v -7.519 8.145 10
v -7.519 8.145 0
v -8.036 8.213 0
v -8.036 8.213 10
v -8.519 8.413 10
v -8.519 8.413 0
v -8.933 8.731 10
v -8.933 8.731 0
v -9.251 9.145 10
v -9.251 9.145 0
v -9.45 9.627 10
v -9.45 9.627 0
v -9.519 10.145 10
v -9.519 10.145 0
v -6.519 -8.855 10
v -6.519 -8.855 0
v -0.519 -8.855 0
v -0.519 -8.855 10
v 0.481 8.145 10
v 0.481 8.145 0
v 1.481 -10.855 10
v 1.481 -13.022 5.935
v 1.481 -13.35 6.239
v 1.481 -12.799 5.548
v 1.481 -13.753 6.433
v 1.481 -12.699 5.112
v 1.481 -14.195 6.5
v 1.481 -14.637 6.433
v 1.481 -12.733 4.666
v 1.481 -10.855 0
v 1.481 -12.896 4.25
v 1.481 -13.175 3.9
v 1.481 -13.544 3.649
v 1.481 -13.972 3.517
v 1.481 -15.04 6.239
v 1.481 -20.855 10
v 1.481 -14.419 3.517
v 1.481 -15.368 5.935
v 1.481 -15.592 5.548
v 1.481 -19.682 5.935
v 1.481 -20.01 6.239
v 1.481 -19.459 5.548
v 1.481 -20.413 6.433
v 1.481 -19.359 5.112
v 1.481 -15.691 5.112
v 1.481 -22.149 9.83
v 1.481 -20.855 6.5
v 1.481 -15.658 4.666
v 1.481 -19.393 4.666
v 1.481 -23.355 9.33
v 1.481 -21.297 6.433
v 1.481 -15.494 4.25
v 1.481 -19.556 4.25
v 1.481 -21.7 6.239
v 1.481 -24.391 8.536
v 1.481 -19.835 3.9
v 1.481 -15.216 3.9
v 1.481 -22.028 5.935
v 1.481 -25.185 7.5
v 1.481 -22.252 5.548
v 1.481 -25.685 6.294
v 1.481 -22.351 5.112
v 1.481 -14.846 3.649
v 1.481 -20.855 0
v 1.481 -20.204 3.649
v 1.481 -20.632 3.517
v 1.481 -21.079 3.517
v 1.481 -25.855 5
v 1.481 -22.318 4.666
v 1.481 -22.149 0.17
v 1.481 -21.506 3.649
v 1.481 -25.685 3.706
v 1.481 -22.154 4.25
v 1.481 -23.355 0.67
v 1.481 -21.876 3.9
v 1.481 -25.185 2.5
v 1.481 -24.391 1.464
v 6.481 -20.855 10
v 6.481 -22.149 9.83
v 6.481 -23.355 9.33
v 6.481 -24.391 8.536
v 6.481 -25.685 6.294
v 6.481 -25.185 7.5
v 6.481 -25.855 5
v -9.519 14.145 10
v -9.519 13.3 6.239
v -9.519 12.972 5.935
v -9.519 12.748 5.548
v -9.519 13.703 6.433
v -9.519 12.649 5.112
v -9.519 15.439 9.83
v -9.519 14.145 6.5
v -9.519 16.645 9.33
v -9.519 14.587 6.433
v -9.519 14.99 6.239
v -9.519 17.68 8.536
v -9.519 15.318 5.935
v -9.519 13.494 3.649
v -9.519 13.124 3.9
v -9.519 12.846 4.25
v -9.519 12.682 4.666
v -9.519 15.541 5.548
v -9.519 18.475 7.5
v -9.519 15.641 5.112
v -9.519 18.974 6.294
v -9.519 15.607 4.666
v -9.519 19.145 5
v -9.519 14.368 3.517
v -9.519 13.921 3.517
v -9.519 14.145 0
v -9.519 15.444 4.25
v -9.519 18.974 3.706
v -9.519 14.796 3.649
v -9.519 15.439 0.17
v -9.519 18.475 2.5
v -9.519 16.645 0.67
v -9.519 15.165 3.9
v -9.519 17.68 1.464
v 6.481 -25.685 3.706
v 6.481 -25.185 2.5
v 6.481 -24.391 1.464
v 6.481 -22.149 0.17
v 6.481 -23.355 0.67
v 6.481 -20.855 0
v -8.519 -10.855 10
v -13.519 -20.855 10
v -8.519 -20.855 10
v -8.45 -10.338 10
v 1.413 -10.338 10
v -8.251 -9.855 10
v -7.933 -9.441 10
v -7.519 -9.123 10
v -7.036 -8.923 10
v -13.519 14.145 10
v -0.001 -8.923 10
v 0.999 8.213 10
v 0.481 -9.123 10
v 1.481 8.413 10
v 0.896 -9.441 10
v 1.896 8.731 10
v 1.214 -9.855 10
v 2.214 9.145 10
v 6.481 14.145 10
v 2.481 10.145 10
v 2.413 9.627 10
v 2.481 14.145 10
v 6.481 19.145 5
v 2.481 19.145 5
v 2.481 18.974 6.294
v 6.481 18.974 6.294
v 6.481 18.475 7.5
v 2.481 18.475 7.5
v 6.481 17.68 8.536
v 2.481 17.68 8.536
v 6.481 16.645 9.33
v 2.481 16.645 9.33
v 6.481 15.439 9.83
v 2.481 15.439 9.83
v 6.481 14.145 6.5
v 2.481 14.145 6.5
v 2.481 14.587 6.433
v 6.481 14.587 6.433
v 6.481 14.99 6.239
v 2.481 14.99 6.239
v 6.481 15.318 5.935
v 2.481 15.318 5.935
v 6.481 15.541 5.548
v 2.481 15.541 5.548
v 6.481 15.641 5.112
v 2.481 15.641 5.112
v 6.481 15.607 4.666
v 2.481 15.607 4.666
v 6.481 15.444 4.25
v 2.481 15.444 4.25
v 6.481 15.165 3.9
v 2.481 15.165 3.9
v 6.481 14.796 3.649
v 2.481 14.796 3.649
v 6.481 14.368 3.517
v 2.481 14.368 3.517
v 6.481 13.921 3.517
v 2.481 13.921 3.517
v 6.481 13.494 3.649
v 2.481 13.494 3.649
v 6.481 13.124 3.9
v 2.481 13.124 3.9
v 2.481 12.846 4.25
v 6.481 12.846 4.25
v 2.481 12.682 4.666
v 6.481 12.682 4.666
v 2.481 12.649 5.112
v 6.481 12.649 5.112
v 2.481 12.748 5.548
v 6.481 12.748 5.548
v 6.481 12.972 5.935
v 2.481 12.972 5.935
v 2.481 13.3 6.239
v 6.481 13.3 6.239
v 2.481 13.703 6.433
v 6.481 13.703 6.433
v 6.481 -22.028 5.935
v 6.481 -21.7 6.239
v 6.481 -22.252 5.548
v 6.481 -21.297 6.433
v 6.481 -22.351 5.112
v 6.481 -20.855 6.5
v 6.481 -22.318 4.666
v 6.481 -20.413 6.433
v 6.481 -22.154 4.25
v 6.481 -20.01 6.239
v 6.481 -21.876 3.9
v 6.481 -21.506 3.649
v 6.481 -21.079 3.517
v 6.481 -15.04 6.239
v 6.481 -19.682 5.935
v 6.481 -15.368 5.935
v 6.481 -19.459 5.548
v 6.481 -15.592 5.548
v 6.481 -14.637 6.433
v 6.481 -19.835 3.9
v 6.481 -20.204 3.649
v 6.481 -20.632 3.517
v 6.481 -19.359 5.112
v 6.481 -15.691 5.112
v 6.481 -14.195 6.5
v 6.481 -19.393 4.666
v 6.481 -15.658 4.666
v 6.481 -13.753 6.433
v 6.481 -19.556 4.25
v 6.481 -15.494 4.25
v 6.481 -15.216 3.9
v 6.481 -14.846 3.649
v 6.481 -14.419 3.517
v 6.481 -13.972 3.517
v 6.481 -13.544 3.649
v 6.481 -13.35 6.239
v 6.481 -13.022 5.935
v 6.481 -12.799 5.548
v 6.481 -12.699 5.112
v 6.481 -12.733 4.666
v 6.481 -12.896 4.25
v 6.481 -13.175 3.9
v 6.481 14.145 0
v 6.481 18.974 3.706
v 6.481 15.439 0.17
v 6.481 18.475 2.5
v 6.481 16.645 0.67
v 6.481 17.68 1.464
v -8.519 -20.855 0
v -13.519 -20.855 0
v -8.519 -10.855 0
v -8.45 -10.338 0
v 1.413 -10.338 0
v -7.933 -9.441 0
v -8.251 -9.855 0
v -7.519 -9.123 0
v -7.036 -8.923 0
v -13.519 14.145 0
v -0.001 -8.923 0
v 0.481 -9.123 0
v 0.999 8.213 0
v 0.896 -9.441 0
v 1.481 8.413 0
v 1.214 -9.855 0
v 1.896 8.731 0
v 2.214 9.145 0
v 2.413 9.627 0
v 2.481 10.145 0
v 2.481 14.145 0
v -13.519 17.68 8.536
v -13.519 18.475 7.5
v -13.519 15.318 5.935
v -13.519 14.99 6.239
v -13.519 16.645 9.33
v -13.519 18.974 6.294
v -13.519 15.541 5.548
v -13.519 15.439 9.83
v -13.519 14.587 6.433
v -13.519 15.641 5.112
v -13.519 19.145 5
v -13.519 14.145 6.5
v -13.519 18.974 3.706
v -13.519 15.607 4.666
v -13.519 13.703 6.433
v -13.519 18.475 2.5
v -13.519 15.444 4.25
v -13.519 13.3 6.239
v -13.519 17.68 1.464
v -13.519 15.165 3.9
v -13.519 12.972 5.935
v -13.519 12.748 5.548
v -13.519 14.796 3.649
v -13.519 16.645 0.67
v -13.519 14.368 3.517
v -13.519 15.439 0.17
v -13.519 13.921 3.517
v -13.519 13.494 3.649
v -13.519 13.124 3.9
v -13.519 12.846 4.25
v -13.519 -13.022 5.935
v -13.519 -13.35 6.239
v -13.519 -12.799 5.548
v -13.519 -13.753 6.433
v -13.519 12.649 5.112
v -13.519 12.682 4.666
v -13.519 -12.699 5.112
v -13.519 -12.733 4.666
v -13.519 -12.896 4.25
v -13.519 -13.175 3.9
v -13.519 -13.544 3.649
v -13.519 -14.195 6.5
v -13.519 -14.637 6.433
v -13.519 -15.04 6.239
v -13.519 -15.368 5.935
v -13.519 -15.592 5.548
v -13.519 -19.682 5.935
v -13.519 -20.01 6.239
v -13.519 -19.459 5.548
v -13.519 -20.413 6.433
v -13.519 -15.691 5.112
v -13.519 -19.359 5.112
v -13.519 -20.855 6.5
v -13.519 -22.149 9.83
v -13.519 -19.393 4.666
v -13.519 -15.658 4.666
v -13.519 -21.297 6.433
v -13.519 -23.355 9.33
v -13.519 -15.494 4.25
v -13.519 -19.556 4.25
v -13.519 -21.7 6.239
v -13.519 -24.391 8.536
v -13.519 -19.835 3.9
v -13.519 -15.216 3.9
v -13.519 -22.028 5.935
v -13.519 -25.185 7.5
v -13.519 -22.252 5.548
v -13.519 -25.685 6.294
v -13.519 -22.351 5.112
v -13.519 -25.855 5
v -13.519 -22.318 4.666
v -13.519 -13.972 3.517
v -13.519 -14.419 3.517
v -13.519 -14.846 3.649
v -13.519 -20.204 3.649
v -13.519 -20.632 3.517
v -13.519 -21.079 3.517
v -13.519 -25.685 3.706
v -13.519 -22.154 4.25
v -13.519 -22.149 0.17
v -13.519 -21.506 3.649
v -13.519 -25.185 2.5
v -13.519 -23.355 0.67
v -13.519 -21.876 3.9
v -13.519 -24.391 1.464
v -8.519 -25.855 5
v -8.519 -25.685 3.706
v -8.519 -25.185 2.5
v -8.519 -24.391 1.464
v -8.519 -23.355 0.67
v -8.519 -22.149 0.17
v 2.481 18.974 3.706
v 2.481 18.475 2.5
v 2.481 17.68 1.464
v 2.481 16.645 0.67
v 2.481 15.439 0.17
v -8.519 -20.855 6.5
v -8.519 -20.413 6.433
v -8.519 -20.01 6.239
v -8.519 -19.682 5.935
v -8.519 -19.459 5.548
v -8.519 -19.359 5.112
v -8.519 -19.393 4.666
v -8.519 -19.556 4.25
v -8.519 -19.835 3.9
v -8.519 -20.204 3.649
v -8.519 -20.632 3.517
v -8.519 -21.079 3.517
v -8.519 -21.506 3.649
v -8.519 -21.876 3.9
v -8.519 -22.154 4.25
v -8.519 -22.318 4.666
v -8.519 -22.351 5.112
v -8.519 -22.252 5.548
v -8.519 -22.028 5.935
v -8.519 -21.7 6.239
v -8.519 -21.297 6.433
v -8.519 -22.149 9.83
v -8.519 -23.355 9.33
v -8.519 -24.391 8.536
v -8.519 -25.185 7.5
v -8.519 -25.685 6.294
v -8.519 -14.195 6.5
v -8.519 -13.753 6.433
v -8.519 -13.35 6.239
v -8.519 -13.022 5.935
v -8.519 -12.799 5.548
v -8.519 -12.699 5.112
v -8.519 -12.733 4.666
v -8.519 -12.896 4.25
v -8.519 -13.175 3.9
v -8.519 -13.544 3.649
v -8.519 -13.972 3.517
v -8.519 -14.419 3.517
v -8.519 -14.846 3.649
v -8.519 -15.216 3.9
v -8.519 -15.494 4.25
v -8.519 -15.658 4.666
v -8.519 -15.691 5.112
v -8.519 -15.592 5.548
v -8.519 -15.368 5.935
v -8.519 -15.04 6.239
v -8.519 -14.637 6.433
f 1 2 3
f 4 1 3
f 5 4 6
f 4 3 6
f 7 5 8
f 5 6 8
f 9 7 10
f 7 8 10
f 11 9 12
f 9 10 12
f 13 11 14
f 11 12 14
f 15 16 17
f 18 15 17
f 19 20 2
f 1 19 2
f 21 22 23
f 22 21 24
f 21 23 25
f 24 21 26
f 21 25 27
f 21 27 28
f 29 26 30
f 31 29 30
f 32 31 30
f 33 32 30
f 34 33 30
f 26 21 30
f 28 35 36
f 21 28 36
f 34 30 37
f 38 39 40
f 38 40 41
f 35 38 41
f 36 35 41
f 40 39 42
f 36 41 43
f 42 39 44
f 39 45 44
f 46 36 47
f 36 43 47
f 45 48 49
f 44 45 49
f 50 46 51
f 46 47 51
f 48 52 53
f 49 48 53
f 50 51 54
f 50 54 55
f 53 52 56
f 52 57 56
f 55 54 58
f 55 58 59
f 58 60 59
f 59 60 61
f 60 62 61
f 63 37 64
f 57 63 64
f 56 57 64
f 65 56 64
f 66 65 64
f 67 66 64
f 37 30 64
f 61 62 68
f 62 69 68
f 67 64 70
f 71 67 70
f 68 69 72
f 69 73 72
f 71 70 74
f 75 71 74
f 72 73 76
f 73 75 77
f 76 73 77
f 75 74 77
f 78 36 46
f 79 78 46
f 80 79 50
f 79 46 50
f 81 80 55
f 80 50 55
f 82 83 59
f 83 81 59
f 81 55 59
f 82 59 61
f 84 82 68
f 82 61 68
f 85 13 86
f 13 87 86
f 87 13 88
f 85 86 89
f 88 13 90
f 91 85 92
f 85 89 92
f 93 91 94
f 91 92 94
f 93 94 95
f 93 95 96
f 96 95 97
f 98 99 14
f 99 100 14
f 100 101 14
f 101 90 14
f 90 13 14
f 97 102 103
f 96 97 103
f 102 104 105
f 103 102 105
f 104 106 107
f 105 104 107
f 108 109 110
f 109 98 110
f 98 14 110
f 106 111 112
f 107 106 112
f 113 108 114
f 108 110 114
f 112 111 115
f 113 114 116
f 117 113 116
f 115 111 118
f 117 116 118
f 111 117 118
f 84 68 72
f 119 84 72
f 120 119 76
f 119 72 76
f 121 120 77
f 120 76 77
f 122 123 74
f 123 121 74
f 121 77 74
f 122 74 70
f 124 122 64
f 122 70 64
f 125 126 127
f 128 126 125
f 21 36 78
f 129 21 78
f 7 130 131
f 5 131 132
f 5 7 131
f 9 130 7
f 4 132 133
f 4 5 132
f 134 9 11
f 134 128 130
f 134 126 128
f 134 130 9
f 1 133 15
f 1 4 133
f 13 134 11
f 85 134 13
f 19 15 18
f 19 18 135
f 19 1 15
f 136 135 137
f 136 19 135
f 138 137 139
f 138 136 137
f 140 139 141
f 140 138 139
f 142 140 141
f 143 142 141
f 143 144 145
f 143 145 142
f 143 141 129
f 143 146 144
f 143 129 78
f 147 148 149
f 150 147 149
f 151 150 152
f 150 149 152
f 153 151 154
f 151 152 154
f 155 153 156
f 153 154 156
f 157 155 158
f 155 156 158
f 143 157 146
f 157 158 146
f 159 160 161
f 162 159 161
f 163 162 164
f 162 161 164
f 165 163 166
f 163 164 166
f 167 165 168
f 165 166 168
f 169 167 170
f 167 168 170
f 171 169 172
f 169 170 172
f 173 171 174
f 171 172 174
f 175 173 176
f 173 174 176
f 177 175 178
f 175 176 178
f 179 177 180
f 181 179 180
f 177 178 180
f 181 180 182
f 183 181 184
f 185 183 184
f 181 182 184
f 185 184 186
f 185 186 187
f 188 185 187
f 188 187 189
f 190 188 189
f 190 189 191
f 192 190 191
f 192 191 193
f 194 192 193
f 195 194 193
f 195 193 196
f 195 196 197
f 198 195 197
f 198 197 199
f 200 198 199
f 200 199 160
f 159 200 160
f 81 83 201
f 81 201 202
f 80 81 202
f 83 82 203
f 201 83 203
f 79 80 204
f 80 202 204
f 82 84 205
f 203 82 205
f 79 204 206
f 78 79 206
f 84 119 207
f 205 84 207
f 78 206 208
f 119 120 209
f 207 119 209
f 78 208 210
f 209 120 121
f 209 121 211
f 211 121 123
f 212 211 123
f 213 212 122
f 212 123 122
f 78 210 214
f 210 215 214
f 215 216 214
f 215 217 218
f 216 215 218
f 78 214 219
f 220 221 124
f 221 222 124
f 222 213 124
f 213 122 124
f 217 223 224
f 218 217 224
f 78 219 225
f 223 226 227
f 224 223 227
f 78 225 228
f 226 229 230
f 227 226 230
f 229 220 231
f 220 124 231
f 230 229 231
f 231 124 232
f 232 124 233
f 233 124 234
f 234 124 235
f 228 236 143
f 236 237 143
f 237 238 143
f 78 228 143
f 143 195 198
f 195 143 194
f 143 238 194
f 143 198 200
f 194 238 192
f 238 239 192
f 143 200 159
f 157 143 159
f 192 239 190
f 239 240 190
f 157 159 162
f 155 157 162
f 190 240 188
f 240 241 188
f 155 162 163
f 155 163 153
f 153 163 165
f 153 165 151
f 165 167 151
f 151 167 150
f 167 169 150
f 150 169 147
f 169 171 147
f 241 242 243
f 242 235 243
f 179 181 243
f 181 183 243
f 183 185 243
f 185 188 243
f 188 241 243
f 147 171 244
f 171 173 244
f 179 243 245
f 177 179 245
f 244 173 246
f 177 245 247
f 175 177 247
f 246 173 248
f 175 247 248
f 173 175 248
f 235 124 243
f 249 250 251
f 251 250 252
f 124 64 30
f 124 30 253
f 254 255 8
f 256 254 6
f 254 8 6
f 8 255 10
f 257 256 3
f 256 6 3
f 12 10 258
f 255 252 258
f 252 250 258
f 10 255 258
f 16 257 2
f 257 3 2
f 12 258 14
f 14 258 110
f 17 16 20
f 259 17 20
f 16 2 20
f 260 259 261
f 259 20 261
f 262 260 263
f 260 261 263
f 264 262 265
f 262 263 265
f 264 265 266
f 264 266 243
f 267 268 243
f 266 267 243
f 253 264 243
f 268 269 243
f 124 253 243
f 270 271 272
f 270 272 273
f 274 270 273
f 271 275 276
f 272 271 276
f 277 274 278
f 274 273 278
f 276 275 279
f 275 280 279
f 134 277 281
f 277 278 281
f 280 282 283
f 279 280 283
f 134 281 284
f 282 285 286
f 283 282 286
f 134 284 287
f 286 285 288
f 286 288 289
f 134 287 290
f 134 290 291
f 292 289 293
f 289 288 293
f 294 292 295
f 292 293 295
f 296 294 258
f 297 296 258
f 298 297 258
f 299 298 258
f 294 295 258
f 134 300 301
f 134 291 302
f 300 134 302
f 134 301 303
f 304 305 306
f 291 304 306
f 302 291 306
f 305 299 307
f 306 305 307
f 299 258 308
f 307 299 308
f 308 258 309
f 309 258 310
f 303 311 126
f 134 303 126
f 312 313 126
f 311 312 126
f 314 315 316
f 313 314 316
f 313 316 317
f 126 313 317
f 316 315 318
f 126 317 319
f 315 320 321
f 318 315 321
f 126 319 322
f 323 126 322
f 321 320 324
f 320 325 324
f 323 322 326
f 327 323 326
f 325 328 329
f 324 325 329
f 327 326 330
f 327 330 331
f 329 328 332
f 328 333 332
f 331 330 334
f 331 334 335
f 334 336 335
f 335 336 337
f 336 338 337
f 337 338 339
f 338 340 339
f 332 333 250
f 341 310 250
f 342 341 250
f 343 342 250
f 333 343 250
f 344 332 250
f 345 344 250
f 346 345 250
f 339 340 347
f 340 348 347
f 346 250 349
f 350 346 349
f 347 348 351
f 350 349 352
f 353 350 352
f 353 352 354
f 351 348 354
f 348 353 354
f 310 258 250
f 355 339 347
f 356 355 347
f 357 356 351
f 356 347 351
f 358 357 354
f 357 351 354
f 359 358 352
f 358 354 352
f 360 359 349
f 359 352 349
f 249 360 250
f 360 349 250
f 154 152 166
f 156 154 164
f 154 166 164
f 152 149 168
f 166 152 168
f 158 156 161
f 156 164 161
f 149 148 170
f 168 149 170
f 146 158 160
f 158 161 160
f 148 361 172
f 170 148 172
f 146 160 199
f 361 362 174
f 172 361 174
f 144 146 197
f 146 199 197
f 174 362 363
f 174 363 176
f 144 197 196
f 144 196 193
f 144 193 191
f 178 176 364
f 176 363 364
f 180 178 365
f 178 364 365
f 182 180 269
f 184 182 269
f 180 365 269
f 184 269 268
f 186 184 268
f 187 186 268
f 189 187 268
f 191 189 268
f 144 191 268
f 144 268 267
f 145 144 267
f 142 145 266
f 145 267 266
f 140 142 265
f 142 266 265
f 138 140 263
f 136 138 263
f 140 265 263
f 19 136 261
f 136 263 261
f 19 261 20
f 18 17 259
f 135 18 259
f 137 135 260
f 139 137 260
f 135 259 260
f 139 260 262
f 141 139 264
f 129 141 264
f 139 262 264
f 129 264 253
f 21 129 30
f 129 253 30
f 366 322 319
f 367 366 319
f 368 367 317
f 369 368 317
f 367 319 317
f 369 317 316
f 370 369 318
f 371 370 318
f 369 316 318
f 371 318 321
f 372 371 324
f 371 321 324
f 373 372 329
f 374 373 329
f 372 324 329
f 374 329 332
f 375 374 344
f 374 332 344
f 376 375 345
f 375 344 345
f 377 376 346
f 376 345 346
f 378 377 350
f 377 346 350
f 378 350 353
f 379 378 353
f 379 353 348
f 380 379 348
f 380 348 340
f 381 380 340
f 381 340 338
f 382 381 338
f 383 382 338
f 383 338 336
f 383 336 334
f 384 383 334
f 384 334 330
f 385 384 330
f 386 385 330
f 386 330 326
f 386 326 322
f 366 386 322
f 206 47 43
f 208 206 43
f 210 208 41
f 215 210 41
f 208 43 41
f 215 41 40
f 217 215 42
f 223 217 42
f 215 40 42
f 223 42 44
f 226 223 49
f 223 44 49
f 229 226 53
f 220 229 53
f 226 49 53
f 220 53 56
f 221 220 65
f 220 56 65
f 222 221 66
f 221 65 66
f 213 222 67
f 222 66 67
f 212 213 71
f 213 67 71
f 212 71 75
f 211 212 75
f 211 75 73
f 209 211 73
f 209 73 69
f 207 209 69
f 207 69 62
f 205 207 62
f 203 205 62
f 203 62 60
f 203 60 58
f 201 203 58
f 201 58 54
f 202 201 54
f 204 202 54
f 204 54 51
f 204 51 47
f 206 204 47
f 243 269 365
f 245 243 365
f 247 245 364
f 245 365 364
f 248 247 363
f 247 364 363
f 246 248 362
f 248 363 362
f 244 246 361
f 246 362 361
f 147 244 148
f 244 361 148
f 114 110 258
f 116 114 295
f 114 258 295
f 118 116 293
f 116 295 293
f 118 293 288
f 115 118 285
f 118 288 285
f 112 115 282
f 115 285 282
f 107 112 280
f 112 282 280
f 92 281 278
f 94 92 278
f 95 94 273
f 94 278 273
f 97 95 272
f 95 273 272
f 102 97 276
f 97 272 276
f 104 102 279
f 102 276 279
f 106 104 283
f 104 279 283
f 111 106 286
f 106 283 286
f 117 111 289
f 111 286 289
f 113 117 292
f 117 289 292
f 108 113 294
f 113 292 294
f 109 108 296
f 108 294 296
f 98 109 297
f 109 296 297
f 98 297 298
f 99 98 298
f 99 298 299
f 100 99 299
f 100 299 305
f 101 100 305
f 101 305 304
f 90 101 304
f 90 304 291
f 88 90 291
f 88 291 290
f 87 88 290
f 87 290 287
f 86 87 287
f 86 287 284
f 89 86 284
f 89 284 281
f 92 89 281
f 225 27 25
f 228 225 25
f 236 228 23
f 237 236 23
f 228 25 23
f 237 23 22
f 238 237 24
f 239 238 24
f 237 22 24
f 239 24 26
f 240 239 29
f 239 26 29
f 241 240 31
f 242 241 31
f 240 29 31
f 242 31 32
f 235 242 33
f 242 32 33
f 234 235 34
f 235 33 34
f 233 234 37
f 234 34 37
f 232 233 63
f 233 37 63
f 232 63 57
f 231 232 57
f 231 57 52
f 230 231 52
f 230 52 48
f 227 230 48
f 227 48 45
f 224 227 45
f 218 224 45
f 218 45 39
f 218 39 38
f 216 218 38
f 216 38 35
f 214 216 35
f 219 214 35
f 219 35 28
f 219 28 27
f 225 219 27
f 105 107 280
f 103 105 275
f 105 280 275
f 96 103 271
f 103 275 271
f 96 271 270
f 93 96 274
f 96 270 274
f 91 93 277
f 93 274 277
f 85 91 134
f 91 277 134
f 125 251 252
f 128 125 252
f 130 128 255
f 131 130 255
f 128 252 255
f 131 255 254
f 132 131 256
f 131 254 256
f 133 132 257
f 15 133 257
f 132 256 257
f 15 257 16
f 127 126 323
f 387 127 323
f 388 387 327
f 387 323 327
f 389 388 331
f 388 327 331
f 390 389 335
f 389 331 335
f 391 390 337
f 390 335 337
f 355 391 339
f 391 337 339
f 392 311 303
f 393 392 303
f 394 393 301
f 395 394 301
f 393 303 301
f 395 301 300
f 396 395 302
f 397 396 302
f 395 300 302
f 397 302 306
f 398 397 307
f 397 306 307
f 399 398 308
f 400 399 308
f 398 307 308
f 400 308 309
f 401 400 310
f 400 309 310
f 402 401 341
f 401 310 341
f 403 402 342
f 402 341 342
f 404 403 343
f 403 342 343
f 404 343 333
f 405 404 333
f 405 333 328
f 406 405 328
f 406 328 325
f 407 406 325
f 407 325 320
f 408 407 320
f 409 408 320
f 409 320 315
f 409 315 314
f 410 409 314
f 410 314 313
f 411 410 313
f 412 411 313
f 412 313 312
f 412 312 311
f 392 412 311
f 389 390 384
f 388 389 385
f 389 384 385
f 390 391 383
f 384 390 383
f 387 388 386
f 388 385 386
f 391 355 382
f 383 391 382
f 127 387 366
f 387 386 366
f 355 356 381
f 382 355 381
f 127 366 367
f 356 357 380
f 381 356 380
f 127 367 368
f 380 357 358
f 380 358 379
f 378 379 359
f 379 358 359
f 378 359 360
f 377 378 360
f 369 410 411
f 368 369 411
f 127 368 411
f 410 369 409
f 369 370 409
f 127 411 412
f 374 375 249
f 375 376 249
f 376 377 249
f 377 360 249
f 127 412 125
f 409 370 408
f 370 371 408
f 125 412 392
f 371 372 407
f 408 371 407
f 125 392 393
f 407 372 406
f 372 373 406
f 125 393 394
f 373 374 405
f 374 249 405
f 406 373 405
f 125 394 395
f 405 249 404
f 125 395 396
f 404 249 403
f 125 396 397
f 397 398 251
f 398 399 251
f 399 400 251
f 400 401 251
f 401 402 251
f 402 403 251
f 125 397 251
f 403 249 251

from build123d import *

# Parameters (mm, degrees)
BOSS_EXTRU_1_DEPTH      = 10
ESQUISSE2_R             = 1.5
ENL_V_MAT_EXTRU_1_DEPTH = 35.183235498


with BuildPart() as part:
    # Esquisse1 → Boss.-Extru.1 (new body)
    with BuildSketch(Plane.XY):
        with BuildLine():
            Line((0.481491326, 8.144757028), (-7.518508674, 8.144757028))
            ThreePointArc((-7.518508674, 8.144757028), (-8.932722237, 8.730543466), (-9.518508674, 10.144757028))
            Line((-9.518508674, 10.144757028), (-9.518508674, 19.144757028))
            Line((-9.518508674, 19.144757028), (-13.518508674, 19.144757028))
            Line((-13.518508674, 19.144757028), (-13.518508674, -25.855242972))
            Line((-13.518508674, -25.855242972), (-8.518508674, -25.855242972))
            Line((-8.518508674, -25.855242972), (-8.518508674, -10.855242972))
            ThreePointArc((-8.518508674, -10.855242972), (-7.932722237, -9.441029409), (-6.518508674, -8.855242972))
            Line((-6.518508674, -8.855242972), (-0.518508674, -8.855242972))
            ThreePointArc((-0.518508674, -8.855242972), (0.895704888, -9.441029409), (1.481491326, -10.855242972))
            Line((1.481491326, -10.855242972), (1.481491326, -25.855242972))
            Line((1.481491326, -25.855242972), (6.481491326, -25.855242972))
            Line((6.481491326, -25.855242972), (6.481491326, 19.144757028))
            Line((6.481491326, 19.144757028), (2.481491326, 19.144757028))
            Line((2.481491326, 19.144757028), (2.481491326, 10.144757028))
            ThreePointArc((2.481491326, 10.144757028), (1.895704888, 8.730543466), (0.481491326, 8.144757028))
        make_face()
    extrude(amount=BOSS_EXTRU_1_DEPTH)

    # Esquisse2 → Enlèv. mat.-Extru.1 (cut, through all)
    with BuildSketch(Plane.ZY.offset(13.518508674)):
        with BuildLine():
            ThreePointArc((10, -20.855242972), (8.535533906, -24.390776877), (5, -25.855242972))
            Line((5, -25.855242972), (10, -25.855242972))
            Line((10, -25.855242972), (10, -20.855242972))
        make_face()
        with BuildLine():
            ThreePointArc((5, -25.855242972), (1.464466094, -24.390776877), (0, -20.855242972))
            Line((0, -20.855242972), (0, -25.855242972))
            Line((0, -25.855242972), (5, -25.855242972))
        make_face()
        with Locations((5, -20.855242972)):
            Circle(ESQUISSE2_R)
        with BuildLine():
            Line((10, 19.144757028), (5, 19.144757028))
            ThreePointArc((5, 19.144757028), (8.535533906, 17.680290934), (10, 14.144757028))
            Line((10, 14.144757028), (10, 19.144757028))
        make_face()
        with BuildLine():
            Line((0, 19.144757028), (0, 14.144757028))
            ThreePointArc((0, 14.144757028), (1.464466094, 17.680290934), (5, 19.144757028))
            Line((5, 19.144757028), (0, 19.144757028))
        make_face()
        with Locations((5, 14.144757028)):
            Circle(ESQUISSE2_R)
        with Locations((5, -14.195242972)):
            Circle(ESQUISSE2_R)
    extrude(amount=-ENL_V_MAT_EXTRU_1_DEPTH, mode=Mode.SUBTRACT)


solid = part.part
